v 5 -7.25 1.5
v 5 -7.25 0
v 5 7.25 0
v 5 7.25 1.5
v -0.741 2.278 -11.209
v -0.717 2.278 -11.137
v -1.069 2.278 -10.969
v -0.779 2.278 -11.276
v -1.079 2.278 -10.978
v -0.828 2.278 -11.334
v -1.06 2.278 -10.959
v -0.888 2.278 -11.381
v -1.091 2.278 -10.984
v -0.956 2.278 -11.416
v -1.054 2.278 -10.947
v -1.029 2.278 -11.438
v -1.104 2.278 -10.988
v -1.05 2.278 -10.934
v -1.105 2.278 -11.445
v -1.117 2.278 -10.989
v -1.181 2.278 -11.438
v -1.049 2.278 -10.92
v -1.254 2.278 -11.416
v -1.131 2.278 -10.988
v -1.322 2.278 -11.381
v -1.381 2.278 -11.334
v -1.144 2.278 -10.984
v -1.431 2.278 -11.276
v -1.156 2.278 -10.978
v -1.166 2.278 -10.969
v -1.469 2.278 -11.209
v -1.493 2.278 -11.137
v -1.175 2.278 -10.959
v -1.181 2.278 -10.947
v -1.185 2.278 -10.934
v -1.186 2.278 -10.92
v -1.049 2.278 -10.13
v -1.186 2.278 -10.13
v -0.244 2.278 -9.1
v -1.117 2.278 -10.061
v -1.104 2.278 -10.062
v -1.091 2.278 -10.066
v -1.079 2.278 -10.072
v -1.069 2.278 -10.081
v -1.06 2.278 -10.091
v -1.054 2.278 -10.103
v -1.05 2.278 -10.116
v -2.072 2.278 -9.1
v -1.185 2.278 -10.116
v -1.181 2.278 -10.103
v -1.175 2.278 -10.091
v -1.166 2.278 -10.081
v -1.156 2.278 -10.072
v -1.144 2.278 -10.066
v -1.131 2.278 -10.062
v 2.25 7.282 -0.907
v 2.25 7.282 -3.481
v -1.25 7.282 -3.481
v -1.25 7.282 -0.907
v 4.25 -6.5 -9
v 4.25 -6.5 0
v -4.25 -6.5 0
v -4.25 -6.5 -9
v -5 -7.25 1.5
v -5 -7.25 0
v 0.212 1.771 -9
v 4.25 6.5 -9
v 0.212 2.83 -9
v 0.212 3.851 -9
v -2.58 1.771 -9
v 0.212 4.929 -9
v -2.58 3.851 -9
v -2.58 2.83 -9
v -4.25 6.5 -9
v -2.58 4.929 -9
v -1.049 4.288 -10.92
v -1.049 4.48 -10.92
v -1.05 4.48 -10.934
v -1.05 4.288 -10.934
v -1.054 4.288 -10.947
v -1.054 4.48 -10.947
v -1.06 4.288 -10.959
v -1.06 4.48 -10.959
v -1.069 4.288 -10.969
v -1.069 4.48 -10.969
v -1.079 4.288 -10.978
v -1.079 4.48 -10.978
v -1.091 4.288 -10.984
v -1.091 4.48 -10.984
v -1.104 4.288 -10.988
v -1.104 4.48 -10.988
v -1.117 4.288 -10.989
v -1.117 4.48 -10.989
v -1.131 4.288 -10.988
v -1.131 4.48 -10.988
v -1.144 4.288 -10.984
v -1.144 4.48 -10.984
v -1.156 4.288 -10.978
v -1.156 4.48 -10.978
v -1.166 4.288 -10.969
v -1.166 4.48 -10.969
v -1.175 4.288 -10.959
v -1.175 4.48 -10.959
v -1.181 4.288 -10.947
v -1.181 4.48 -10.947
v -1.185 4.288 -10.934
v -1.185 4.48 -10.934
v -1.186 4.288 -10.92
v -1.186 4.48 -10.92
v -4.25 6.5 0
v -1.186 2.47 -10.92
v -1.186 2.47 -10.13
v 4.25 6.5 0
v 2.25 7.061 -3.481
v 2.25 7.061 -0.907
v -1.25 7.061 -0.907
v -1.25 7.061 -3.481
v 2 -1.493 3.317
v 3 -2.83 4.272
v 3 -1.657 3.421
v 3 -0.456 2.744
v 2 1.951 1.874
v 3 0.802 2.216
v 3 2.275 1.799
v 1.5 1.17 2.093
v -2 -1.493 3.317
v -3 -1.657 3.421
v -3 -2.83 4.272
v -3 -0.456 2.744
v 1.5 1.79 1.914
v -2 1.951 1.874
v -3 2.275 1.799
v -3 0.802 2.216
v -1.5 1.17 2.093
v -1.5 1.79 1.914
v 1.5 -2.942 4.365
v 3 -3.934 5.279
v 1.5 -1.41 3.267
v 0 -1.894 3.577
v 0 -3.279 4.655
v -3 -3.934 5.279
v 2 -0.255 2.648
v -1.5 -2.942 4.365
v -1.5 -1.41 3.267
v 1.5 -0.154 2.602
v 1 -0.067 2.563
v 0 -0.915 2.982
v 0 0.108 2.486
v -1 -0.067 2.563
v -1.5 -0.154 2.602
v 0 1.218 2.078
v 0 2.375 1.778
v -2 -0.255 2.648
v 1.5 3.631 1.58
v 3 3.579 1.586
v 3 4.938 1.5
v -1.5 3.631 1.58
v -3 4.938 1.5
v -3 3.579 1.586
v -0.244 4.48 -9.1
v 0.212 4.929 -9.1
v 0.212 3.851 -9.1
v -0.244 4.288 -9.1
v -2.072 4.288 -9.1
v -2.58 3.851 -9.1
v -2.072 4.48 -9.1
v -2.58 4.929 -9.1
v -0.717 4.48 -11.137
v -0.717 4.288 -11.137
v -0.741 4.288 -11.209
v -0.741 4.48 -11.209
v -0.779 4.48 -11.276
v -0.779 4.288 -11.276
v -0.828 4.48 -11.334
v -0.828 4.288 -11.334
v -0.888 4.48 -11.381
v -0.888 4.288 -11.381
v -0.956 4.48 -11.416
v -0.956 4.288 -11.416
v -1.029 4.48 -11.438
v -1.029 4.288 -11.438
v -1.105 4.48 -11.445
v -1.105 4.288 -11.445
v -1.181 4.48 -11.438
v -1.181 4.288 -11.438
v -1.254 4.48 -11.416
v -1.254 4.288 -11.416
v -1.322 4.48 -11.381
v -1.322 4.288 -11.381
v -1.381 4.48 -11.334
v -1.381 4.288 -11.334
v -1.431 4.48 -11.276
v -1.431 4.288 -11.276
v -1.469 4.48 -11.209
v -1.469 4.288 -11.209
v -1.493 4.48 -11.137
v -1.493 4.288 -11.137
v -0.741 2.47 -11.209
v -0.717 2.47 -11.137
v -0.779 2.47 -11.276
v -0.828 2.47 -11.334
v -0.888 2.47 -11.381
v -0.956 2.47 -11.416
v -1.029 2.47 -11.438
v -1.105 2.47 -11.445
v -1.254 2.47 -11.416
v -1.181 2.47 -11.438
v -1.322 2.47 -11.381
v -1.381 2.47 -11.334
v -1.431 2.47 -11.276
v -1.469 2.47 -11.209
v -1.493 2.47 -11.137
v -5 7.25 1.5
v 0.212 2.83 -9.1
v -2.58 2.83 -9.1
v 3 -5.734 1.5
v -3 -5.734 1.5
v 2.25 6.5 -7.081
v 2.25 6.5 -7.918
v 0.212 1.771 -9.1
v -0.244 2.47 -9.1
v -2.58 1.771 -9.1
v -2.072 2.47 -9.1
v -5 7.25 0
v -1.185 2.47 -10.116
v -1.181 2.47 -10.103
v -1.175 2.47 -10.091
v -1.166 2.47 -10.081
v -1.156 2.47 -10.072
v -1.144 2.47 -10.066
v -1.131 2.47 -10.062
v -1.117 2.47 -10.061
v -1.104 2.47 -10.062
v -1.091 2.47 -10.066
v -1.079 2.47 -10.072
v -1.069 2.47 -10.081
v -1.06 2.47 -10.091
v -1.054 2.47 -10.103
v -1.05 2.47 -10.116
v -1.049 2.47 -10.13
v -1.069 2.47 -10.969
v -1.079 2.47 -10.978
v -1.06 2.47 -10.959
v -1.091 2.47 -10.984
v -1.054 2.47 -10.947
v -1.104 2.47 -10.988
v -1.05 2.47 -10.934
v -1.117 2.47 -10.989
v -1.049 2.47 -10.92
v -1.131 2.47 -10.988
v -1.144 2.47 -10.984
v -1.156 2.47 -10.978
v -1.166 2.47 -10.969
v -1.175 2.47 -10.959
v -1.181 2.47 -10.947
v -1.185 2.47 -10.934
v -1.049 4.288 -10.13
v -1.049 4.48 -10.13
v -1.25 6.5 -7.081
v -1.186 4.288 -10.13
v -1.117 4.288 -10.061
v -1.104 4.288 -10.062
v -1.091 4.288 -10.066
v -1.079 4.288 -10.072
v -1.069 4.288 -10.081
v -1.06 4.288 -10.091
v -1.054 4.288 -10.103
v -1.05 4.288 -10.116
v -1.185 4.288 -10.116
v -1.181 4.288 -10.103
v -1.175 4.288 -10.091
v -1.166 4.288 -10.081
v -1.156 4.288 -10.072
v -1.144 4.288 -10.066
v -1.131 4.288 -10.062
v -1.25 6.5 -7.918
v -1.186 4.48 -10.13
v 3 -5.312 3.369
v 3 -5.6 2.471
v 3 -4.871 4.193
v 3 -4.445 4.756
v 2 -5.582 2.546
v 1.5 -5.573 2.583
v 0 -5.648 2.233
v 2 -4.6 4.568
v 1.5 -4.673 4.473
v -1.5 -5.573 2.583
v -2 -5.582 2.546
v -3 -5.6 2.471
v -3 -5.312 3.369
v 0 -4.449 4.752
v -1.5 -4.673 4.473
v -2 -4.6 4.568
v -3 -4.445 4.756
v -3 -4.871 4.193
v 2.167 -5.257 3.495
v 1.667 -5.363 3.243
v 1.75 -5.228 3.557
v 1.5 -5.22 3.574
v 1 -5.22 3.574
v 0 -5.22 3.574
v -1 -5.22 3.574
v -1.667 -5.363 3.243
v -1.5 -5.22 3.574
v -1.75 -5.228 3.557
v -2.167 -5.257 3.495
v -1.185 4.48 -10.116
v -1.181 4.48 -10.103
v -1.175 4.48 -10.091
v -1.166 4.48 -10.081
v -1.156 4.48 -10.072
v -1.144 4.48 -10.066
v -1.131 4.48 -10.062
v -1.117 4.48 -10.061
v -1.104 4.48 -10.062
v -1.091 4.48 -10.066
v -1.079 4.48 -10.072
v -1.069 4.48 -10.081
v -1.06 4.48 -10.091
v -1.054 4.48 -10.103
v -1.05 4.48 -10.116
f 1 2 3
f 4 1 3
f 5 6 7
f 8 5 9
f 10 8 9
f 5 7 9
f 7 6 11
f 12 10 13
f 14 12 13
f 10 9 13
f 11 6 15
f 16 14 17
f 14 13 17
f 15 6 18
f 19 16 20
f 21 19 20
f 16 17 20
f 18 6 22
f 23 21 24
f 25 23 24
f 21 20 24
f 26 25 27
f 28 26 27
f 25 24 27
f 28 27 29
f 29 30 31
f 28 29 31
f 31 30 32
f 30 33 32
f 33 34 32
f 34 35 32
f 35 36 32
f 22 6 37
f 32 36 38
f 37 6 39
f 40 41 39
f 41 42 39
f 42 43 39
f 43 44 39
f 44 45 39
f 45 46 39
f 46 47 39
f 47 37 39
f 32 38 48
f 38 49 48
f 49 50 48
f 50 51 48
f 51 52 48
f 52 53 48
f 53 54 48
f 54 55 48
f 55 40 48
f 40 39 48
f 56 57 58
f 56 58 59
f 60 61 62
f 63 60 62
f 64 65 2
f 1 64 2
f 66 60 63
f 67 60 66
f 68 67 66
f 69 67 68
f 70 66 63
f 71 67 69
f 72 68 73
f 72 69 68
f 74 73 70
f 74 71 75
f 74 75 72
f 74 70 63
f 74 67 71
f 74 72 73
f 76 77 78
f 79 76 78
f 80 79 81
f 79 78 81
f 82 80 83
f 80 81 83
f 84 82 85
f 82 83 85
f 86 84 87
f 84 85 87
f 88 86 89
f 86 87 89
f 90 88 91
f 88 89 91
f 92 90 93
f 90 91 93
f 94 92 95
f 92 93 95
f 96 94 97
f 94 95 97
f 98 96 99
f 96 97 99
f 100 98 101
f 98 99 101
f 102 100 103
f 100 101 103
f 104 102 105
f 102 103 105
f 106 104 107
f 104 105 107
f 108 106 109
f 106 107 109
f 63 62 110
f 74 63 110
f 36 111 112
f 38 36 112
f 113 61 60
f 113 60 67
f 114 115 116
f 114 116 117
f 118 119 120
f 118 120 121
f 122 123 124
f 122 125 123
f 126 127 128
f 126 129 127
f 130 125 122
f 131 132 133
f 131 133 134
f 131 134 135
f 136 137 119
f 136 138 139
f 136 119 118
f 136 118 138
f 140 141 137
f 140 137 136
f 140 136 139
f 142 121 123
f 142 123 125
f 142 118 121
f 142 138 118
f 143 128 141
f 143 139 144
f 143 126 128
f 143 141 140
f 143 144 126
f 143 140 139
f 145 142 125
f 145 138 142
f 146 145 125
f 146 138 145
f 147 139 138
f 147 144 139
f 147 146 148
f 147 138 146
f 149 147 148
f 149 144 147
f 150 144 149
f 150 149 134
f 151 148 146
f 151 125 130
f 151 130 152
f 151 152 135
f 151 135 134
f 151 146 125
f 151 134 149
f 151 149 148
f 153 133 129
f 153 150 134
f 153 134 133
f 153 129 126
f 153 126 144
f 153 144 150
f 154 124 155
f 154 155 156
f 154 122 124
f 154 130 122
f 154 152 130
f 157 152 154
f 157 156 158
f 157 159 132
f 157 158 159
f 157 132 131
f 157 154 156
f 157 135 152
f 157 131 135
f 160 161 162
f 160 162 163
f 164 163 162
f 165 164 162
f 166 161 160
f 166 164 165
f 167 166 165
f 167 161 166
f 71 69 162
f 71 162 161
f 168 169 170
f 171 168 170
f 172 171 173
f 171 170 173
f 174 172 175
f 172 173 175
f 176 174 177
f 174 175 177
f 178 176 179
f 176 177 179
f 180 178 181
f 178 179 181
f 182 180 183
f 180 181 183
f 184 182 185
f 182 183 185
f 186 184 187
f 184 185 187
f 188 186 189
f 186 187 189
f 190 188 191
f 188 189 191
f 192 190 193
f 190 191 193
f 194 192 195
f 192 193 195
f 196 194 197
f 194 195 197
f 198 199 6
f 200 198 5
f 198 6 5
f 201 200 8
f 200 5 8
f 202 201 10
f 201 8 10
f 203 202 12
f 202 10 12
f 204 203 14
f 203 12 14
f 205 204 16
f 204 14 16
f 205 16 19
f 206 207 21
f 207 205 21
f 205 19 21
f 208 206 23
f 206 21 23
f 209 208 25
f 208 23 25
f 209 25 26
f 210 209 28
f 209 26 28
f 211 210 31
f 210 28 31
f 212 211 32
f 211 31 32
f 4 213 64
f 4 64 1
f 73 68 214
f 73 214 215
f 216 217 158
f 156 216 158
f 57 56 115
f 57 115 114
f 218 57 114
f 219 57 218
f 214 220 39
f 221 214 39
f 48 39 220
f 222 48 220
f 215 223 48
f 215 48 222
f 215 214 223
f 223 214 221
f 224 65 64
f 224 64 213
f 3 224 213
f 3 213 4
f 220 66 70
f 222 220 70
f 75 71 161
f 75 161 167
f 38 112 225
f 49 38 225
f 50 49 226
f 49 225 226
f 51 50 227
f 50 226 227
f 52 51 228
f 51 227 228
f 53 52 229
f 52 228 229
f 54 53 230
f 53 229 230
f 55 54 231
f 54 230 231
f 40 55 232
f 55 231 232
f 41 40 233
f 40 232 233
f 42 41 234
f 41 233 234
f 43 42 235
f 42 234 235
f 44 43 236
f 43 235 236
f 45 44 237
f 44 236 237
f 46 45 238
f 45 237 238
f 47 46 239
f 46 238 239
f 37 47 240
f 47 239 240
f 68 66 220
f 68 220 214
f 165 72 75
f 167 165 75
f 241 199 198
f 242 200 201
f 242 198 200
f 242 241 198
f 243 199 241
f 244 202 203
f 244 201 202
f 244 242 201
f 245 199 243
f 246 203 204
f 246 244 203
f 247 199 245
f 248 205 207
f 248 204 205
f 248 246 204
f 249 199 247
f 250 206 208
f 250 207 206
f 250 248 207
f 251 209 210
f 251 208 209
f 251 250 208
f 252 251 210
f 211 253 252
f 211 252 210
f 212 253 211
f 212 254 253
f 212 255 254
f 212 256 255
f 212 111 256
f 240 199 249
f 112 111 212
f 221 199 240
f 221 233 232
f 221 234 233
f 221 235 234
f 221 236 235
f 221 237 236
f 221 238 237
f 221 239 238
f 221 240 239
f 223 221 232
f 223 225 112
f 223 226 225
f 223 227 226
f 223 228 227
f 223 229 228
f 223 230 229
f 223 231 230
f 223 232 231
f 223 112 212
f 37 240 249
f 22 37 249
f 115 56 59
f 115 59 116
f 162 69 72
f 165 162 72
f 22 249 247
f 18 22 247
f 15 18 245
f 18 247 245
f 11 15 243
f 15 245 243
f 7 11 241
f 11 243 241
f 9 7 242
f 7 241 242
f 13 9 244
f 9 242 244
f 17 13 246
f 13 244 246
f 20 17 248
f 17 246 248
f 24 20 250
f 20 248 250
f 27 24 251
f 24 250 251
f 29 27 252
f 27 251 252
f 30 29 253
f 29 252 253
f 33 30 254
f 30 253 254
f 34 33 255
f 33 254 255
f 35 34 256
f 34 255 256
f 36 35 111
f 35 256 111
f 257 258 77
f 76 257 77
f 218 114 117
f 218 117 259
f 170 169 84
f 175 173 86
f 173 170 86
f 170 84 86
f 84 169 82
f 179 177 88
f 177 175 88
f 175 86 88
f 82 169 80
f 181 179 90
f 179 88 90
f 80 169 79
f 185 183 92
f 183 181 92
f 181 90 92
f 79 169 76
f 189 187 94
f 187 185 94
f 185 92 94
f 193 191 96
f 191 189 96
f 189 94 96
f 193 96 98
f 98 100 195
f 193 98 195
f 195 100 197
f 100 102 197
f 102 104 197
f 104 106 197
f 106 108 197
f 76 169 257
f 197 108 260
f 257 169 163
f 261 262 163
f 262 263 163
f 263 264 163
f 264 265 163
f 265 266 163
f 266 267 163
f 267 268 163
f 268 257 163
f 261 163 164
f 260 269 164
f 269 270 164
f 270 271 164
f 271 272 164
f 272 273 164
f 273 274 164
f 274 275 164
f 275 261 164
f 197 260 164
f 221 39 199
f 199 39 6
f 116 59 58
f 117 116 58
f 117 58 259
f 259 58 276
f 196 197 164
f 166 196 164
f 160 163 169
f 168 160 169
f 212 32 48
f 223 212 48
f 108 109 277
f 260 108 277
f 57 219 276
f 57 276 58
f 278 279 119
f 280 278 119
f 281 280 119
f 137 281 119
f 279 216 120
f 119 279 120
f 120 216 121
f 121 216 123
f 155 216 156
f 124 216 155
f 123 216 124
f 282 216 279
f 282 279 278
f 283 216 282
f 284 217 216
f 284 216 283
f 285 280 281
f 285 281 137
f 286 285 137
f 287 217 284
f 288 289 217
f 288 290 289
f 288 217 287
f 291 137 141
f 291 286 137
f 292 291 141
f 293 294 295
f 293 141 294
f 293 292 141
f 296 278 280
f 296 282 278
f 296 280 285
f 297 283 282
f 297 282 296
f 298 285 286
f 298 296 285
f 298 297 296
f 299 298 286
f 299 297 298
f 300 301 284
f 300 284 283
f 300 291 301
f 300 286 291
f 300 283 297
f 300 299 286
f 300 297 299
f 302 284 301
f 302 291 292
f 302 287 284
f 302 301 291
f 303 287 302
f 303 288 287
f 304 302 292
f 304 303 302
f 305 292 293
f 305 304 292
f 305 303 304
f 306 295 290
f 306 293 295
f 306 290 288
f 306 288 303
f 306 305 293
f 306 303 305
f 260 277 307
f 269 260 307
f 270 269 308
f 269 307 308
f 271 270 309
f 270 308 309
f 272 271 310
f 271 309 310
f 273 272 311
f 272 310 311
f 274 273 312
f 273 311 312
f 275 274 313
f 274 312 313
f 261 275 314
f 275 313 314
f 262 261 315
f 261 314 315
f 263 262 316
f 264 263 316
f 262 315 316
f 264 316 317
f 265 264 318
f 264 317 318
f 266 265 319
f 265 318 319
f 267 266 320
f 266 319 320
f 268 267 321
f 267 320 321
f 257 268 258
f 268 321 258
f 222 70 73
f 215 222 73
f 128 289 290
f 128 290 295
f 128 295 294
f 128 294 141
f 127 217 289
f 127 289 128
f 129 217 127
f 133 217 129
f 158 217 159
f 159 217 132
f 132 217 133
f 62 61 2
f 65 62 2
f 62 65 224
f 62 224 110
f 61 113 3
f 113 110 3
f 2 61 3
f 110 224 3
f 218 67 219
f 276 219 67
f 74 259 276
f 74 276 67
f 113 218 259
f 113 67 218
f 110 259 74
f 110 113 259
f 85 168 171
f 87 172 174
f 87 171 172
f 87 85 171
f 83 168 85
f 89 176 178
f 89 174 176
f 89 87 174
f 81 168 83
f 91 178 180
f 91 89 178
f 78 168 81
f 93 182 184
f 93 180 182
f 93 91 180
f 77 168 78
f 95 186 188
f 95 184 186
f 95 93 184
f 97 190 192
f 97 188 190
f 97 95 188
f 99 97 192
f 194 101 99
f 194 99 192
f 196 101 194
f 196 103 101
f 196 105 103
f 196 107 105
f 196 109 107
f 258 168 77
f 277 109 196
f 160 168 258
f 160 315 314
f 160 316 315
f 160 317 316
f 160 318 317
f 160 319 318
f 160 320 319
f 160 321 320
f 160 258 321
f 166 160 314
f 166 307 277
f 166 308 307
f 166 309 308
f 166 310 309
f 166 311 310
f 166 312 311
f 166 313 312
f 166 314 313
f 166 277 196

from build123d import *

# Parameters (mm, degrees)
SKETCH1_W               = 10
SKETCH1_H               = 14.5
BOSS_EXTRUDE1_DEPTH     = 1.5
SKETCH2_W               = 8.5
SKETCH2_H               = 13
BOSS_EXTRUDE2_DEPTH     = 9
SKETCH3_W               = 2.791946686
SKETCH3_H               = 1.078269065
SKETCH3_H_2             = 1.059014261
BOSS_EXTRUDE3_DEPTH     = 0.1
SKETCH4_W               = 1.827601408
SKETCH4_H               = 0.191898148
SKETCH4_H_2             = 0.191898147
BOSS_EXTRUDE4_DEPTH     = 2.5
CUT_EXTRUDE1_DEPTH      = 16.822021608
CUT_EXTRUDE2_DEPTH      = 16.708866747
CUT_EXTRUDE2_DEPTH_BACK = 16.708866747
BOSS_EXTRUDE5_DEPTH     = 3.5
BOSS_EXTRUDE6_DEPTH     = 6


with BuildPart() as part:
    # Sketch1 → Boss-Extrude1 (new body)
    with BuildSketch(Plane.XY):
        Rectangle(SKETCH1_W, SKETCH1_H)
    extrude(amount=BOSS_EXTRUDE1_DEPTH)

    # Sketch2 → Boss-Extrude2 (add)
    with BuildSketch(Plane(origin=(0, 0, 0), x_dir=(-1, 0, 0), z_dir=(0, 0, -1))):
        Rectangle(SKETCH2_W, SKETCH2_H)
    extrude(amount=BOSS_EXTRUDE2_DEPTH)

    # Sketch3 → Boss-Extrude3 (add)
    with BuildSketch(Plane(origin=(0, 0, -9), x_dir=(-1, 0, 0), z_dir=(0, 0, -1))):
        with Locations((1.184170491, 4.39009548)):
            Rectangle(SKETCH3_W, SKETCH3_H)
        with Locations((1.184170491, 2.300949166)):
            Rectangle(SKETCH3_W, SKETCH3_H_2)
    extrude(amount=BOSS_EXTRUDE3_DEPTH)

    # Sketch4 → Boss-Extrude4 (add)
    with BuildSketch(Plane(origin=(0, 0, -9.1), x_dir=(-1, 0, 0), z_dir=(0, 0, -1))):
        with Locations((1.158258605, 4.383973913)):
            Rectangle(SKETCH4_W, SKETCH4_H)
        with Locations((1.158258605, 2.373612365)):
            Rectangle(SKETCH4_W, SKETCH4_H_2)
    extrude(amount=BOSS_EXTRUDE4_DEPTH)

    # Sketch5 → Cut-Extrude1 (cut, through all)
    with BuildSketch(Plane.XZ.offset(-2.277663291)):
        with BuildLine():
            Line((-0.244457901, -9.1), (-0.716850813, -11.136852213))
            ThreePointArc((-0.716850813, -11.136852213), (-1.104869499, -11.44517919), (-1.492888184, -11.136852213))
            Line((-1.492888184, -11.136852213), (-2.072059309, -9.1))
            Line((-2.072059309, -9.1), (-2.072059309, -11.6))
            Line((-2.072059309, -11.6), (-0.244457901, -11.6))
            Line((-0.244457901, -11.6), (-0.244457901, -9.1))
        make_face()
    extrude(amount=-CUT_EXTRUDE1_DEPTH, mode=Mode.SUBTRACT)

    # Sketch6 → Cut-Extrude2 (cut, two sides: drawn at the far end of the back side and taken through both)
    with BuildSketch(Plane.XZ.offset(-2.277663291).offset(-CUT_EXTRUDE2_DEPTH_BACK)):
        with BuildLine():
            Line((-1.18611903, -10.920374874), (-1.18611903, -10.129628854))
            ThreePointArc((-1.18611903, -10.129628854), (-1.117358506, -10.060868331), (-1.048597983, -10.129628854))
            Line((-1.048597983, -10.129628854), (-1.048597983, -10.920374874))
            ThreePointArc((-1.048597983, -10.920374874), (-1.117358506, -10.989135398), (-1.18611903, -10.920374874))
        make_face()
    extrude(amount=CUT_EXTRUDE2_DEPTH + CUT_EXTRUDE2_DEPTH_BACK, mode=Mode.SUBTRACT)

    # Sketch7 → Boss-Extrude5 (add)
    with BuildSketch(Plane(origin=(2.25, 0, 0), x_dir=(0, 0, -1), z_dir=(1, 0, 0))):
        Polygon((7.918280304, 6.5), (3.481156502, 7.282461104), (0.907308887, 7.282461104), (0.907308887, 7.061394438), (3.481156502, 7.061394438), (7.081385067, 6.5), align=None)
    extrude(amount=-BOSS_EXTRUDE5_DEPTH)


with BuildPart() as body_2:
    # Sketch8 → Boss-Extrude6 (new body)
    with BuildSketch(Plane(origin=(3, 0, 0), x_dir=(0, 0, -1), z_dir=(1, 0, 0))):
        with BuildLine():
            add(Edge.make_bspline(
                [(-1.5, -5.733564241), (-3.759190449, -5.60540311), (-5.278855164, -3.934348818)],
                knots=[0, 0, 0, 1, 1, 1], degree=2))
            Line((-1.5, -5.733564241), (-1.5, 4.938044071))
            add(Edge.make_bspline(
                [(-5.278855164, -3.934348818), (-1.583424744, -0.285510331), (-1.5, 4.938044071)],
                knots=[0, 0, 0, 0.955846551, 0.955846551, 0.955846551], degree=2))
        make_face()
    extrude(amount=-BOSS_EXTRUDE6_DEPTH)


solid = Compound([part.part, body_2.part])
